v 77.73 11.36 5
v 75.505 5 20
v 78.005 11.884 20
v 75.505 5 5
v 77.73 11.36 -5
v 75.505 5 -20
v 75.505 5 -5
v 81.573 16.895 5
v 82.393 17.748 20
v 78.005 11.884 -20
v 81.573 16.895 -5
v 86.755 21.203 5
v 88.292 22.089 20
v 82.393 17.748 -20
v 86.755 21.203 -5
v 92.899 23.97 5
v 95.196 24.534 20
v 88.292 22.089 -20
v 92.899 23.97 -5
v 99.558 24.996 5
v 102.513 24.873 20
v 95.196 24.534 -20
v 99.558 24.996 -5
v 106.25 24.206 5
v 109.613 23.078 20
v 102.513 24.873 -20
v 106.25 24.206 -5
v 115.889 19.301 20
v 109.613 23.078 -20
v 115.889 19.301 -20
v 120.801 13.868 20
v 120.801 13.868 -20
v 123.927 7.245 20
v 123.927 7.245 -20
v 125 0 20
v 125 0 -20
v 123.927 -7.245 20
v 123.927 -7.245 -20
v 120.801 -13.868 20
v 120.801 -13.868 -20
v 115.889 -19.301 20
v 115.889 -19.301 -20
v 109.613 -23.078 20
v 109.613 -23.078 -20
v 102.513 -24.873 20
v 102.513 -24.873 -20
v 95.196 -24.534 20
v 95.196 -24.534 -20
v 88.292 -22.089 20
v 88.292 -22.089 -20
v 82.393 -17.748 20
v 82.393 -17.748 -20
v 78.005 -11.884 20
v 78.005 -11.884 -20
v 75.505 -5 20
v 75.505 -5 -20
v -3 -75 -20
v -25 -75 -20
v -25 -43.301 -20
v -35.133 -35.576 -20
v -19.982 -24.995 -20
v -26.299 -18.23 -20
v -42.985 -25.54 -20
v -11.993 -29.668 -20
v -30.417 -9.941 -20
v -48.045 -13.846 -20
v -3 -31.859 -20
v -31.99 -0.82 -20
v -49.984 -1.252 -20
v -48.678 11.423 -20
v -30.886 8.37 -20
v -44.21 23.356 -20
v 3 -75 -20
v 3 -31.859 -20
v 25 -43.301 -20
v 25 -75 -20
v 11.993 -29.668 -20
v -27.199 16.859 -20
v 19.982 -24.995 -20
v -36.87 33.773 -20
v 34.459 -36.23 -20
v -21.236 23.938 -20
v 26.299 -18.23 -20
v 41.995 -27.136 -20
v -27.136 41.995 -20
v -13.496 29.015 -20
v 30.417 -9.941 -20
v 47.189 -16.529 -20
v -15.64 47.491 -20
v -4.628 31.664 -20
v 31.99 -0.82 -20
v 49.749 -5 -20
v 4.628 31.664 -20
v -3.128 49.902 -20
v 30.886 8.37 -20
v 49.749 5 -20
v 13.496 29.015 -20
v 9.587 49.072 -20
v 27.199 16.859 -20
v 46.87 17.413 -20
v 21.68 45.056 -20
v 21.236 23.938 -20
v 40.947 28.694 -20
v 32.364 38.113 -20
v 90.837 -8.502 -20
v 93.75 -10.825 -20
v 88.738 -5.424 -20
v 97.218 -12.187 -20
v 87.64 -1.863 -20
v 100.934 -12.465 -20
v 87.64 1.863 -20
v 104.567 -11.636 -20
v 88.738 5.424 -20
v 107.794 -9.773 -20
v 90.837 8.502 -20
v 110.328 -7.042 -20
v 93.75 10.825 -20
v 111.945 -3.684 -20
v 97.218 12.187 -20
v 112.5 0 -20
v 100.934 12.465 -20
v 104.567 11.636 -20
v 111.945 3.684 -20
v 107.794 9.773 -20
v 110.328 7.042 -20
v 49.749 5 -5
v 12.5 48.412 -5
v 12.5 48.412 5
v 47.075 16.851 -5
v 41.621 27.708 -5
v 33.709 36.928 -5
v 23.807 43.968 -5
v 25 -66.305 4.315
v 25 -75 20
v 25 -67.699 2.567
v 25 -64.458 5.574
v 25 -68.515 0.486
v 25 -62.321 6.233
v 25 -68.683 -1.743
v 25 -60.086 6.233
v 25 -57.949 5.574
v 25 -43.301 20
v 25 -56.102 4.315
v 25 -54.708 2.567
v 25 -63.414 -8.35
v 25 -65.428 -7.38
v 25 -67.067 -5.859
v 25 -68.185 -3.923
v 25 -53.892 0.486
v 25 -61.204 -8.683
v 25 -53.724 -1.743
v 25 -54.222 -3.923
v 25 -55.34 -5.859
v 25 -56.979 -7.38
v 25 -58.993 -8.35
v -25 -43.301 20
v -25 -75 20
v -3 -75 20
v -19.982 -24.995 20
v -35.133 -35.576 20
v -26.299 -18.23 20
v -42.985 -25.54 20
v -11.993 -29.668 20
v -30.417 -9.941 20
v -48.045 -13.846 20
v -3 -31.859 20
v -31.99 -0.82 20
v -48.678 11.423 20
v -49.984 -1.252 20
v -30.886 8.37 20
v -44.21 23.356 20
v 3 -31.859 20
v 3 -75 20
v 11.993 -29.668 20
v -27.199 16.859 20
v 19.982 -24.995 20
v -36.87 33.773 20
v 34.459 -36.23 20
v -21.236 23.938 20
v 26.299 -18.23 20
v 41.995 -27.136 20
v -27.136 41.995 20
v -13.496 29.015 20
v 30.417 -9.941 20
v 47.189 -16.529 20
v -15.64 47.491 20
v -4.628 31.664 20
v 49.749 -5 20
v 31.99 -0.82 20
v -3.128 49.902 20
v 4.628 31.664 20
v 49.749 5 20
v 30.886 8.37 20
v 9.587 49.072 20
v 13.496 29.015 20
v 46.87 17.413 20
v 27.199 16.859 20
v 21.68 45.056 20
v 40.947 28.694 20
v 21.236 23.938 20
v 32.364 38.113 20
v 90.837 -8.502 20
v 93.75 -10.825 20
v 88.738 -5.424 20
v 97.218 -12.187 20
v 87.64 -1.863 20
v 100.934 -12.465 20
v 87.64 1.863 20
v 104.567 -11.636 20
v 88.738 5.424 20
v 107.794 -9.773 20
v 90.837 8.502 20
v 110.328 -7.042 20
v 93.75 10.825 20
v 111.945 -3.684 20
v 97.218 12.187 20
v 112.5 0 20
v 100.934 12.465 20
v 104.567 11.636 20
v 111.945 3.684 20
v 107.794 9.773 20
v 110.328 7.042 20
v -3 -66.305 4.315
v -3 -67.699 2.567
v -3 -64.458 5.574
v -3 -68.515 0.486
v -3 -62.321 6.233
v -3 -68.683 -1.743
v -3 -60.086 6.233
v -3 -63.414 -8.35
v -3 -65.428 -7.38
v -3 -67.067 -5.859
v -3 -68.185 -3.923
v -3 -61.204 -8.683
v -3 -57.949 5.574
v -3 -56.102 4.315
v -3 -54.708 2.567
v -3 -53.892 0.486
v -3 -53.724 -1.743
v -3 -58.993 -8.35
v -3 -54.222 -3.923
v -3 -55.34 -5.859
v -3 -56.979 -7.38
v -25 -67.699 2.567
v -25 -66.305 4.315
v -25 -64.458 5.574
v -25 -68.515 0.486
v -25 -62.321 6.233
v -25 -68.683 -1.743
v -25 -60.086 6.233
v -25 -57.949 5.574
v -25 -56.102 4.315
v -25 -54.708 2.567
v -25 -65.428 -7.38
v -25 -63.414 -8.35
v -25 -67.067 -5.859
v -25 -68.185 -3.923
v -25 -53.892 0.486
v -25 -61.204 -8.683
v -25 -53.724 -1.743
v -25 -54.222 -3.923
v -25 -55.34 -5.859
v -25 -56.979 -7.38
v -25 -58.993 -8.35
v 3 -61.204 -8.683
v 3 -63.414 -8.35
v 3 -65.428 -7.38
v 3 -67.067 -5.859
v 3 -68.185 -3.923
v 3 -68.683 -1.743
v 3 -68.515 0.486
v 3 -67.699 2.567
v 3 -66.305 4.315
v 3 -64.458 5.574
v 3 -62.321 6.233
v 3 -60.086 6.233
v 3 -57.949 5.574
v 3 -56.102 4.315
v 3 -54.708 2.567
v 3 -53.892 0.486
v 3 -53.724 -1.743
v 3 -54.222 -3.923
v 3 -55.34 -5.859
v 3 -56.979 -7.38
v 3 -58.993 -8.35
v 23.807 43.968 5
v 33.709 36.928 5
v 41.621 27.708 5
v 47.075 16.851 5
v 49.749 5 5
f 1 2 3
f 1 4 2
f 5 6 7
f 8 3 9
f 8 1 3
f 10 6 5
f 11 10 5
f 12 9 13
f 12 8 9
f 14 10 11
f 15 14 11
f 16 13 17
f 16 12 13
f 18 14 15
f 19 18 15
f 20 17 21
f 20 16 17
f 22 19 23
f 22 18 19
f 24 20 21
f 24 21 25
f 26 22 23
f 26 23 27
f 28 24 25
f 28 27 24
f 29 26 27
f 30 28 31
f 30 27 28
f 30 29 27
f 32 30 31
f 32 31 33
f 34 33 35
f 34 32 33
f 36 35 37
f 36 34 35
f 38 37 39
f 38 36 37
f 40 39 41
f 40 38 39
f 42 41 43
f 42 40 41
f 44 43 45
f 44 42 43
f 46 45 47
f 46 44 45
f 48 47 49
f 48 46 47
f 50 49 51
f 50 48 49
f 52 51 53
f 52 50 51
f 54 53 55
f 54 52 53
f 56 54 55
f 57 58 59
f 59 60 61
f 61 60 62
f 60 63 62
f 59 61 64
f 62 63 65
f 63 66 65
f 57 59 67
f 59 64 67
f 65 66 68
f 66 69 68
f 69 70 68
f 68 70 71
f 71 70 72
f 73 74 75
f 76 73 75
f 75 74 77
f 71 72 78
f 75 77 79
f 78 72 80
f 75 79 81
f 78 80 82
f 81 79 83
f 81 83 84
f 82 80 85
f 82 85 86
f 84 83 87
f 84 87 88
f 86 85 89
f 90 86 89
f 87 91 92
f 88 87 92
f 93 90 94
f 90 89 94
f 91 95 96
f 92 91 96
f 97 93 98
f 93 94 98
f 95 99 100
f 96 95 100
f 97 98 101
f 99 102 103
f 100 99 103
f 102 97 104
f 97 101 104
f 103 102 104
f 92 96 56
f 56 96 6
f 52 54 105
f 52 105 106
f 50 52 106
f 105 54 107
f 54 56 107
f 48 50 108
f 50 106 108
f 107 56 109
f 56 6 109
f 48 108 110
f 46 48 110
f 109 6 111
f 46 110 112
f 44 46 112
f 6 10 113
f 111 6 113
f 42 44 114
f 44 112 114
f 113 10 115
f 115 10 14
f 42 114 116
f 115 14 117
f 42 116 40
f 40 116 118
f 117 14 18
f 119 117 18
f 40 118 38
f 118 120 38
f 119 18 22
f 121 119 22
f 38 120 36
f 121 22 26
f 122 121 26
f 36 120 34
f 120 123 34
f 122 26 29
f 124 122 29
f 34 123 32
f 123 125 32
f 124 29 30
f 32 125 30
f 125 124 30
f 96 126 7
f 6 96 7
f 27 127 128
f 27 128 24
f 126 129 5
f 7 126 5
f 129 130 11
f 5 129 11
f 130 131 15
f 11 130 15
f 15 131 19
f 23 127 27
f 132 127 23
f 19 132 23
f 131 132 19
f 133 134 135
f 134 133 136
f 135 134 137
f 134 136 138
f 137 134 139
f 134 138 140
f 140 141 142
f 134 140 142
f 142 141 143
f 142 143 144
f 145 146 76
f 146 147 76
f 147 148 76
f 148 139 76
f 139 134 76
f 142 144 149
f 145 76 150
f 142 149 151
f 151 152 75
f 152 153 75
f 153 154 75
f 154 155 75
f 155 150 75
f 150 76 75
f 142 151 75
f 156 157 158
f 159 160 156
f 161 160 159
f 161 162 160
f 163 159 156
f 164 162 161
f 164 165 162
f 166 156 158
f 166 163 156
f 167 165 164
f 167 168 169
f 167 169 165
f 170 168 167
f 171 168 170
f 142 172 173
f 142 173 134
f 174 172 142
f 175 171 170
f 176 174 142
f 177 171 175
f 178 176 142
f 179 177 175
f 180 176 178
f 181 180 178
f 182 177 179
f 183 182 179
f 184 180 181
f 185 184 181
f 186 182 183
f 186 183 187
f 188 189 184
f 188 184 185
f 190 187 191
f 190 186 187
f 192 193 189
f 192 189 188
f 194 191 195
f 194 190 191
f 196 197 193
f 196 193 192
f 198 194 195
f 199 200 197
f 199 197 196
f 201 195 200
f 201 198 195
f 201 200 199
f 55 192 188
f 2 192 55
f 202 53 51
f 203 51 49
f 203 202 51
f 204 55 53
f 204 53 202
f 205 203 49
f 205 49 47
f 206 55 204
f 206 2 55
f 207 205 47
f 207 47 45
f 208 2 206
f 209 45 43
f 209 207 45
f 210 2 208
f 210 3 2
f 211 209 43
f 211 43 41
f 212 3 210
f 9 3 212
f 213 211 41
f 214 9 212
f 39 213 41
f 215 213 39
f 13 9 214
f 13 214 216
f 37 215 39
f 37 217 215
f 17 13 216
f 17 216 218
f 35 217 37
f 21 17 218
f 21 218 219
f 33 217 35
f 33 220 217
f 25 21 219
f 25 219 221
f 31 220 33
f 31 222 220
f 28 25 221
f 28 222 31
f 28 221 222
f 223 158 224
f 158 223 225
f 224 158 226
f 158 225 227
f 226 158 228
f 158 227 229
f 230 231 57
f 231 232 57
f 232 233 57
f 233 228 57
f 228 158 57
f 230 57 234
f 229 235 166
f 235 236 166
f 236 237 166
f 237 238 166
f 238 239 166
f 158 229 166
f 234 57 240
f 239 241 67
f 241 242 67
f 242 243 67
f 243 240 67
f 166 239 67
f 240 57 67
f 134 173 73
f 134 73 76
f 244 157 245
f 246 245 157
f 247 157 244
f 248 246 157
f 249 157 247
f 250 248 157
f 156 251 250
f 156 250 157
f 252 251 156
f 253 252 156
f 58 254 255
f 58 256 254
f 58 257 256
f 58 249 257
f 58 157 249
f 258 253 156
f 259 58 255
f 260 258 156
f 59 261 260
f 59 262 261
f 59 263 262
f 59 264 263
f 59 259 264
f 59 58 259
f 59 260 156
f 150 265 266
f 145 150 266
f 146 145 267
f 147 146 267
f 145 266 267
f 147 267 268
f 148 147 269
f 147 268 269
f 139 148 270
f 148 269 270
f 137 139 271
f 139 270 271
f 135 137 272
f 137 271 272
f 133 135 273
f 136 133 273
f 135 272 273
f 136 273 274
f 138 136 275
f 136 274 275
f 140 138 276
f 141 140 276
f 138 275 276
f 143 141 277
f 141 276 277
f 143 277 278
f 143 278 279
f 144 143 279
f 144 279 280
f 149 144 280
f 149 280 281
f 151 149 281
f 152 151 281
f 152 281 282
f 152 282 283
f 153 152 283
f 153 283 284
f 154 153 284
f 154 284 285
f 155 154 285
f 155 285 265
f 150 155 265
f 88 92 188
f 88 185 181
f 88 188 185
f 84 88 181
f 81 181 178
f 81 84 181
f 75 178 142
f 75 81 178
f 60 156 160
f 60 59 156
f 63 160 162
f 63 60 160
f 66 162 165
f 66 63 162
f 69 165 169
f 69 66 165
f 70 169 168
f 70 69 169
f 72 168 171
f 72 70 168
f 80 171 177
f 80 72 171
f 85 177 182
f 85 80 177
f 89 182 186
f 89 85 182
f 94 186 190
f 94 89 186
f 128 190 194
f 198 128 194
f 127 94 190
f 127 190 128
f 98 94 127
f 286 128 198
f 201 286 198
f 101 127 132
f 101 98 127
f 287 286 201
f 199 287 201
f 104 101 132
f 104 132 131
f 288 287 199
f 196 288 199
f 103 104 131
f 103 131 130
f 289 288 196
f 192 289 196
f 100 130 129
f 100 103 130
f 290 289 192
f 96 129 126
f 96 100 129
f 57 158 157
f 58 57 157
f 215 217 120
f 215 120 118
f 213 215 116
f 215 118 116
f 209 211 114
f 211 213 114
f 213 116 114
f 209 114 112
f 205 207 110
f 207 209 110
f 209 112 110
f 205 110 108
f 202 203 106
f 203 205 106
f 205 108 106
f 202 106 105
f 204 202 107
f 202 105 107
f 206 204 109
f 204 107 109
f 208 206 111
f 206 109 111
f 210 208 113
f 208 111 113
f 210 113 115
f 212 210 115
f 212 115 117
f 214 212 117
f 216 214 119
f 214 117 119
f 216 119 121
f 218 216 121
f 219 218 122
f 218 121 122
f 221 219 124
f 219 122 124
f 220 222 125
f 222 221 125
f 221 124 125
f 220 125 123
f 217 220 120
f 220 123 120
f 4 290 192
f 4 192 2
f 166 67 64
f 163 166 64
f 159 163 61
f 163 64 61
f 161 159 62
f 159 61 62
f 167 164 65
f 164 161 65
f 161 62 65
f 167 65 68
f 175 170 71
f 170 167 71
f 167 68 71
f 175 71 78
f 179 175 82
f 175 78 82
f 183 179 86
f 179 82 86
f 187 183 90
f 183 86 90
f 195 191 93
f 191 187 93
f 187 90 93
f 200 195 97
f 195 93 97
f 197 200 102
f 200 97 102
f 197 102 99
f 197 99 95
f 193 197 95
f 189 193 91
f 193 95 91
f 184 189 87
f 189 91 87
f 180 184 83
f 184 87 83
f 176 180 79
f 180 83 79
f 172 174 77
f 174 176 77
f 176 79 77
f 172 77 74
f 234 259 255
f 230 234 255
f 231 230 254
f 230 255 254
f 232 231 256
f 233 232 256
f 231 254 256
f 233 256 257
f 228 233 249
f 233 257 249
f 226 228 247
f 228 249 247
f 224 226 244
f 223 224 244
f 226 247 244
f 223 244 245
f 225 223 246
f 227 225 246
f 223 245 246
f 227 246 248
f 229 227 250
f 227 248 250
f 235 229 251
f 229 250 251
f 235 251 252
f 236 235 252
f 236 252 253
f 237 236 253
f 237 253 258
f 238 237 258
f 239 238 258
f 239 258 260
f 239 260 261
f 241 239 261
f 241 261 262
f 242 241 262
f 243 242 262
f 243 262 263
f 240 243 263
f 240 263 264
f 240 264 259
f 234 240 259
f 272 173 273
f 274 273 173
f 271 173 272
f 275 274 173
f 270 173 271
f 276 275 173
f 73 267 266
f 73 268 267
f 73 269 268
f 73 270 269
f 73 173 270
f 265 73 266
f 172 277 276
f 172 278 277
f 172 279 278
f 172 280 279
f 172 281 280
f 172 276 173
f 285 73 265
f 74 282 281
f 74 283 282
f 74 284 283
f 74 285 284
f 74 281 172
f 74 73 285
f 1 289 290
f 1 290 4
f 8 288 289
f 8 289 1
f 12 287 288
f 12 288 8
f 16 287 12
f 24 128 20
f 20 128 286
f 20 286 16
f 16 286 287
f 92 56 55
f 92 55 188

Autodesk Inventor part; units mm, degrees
ref_plane "YZ Plane" through (0, 0, 0) normal (1, 0, 0) x (0, 1, 0)
ref_plane "XZ Plane" through (0, 0, 0) normal (0, 1, 0) x (-1, 0, 0)
ref_plane "XY Plane" through (0, 0, 0) normal (0, 0, 1) x (1, 0, 0)
sketch "Náčrt1" plane through (0, 0, 0) normal (0, 0, 1) x (1, 0, 0)
  arc A0 (3, -31.8591) -> (-3, -31.8591) centre (0, 0) ccw
  circle A1 centre (100, 0) radius 12.5
  arc A2 (75.5051, -5) -> (75.5051, 5) centre (100, 0) ccw
  line L0 (12.5, 48.4123) -> (106.25, 24.2061)
  line L1 (49.7494, 5) -> (75.5051, 5)
  line L2 (75.5051, -5) -> (49.7494, -5)
  line L3 (3, -75) -> (25, -75)
  line L4 (-3, -75) -> (-25, -75)
  line L5 (-25, -75) -> (-25, -43.3013)
  line L6 (25, -75) -> (25, -43.3013)
  line L7 (3, -75) -> (3, -31.8591)
  line L8 (-3, -75) -> (-3, -31.8591)
  arc A3 (25, -43.3013) -> (49.7494, -5) centre (0, 0) ccw
  arc A4 (49.7494, 5) -> (-25, -43.3013) centre (0, 0) ccw
  dimension "d1" = 64
  dimension "d3" = 25
  dimension "d4" = 50
  dimension "d9" = 10
  dimension "d10" = 22
  dimension "d11" = 22
  dimension "d12" = 6
extrude "Vysunutí1" add sketch "Náčrt1" against normal blind 20 contours A0 L8 L4 L5 A4 L1 A2 L2 A3 L6 L3 L7
extrude "Vysunutí2" add sketch "Náčrt1" against normal blind 5 contours L0 A2 L1 A4
extrude "Vysunutí3" add sketch "Náčrt1" along normal blind 5 contours L0 A2 L1 A4
extrude "Vysunutí4" add sketch "Náčrt1" along normal blind 20 contours A0 L8 L4 L5 A4 L1 A2 L2 A3 L6 L3 L7
sketch "Náčrt2" plane through (25, -75, -20) normal (1, 0, 0) x (0, 0, -1)
  point P0 (-20, 75)
  point P1 (-18.8172, 13.7965)
hole "Díra1" at (25, -61.2035, -1.1828) direction (-1, 0, 0) diameter 15 end through all
properties part number "5"
